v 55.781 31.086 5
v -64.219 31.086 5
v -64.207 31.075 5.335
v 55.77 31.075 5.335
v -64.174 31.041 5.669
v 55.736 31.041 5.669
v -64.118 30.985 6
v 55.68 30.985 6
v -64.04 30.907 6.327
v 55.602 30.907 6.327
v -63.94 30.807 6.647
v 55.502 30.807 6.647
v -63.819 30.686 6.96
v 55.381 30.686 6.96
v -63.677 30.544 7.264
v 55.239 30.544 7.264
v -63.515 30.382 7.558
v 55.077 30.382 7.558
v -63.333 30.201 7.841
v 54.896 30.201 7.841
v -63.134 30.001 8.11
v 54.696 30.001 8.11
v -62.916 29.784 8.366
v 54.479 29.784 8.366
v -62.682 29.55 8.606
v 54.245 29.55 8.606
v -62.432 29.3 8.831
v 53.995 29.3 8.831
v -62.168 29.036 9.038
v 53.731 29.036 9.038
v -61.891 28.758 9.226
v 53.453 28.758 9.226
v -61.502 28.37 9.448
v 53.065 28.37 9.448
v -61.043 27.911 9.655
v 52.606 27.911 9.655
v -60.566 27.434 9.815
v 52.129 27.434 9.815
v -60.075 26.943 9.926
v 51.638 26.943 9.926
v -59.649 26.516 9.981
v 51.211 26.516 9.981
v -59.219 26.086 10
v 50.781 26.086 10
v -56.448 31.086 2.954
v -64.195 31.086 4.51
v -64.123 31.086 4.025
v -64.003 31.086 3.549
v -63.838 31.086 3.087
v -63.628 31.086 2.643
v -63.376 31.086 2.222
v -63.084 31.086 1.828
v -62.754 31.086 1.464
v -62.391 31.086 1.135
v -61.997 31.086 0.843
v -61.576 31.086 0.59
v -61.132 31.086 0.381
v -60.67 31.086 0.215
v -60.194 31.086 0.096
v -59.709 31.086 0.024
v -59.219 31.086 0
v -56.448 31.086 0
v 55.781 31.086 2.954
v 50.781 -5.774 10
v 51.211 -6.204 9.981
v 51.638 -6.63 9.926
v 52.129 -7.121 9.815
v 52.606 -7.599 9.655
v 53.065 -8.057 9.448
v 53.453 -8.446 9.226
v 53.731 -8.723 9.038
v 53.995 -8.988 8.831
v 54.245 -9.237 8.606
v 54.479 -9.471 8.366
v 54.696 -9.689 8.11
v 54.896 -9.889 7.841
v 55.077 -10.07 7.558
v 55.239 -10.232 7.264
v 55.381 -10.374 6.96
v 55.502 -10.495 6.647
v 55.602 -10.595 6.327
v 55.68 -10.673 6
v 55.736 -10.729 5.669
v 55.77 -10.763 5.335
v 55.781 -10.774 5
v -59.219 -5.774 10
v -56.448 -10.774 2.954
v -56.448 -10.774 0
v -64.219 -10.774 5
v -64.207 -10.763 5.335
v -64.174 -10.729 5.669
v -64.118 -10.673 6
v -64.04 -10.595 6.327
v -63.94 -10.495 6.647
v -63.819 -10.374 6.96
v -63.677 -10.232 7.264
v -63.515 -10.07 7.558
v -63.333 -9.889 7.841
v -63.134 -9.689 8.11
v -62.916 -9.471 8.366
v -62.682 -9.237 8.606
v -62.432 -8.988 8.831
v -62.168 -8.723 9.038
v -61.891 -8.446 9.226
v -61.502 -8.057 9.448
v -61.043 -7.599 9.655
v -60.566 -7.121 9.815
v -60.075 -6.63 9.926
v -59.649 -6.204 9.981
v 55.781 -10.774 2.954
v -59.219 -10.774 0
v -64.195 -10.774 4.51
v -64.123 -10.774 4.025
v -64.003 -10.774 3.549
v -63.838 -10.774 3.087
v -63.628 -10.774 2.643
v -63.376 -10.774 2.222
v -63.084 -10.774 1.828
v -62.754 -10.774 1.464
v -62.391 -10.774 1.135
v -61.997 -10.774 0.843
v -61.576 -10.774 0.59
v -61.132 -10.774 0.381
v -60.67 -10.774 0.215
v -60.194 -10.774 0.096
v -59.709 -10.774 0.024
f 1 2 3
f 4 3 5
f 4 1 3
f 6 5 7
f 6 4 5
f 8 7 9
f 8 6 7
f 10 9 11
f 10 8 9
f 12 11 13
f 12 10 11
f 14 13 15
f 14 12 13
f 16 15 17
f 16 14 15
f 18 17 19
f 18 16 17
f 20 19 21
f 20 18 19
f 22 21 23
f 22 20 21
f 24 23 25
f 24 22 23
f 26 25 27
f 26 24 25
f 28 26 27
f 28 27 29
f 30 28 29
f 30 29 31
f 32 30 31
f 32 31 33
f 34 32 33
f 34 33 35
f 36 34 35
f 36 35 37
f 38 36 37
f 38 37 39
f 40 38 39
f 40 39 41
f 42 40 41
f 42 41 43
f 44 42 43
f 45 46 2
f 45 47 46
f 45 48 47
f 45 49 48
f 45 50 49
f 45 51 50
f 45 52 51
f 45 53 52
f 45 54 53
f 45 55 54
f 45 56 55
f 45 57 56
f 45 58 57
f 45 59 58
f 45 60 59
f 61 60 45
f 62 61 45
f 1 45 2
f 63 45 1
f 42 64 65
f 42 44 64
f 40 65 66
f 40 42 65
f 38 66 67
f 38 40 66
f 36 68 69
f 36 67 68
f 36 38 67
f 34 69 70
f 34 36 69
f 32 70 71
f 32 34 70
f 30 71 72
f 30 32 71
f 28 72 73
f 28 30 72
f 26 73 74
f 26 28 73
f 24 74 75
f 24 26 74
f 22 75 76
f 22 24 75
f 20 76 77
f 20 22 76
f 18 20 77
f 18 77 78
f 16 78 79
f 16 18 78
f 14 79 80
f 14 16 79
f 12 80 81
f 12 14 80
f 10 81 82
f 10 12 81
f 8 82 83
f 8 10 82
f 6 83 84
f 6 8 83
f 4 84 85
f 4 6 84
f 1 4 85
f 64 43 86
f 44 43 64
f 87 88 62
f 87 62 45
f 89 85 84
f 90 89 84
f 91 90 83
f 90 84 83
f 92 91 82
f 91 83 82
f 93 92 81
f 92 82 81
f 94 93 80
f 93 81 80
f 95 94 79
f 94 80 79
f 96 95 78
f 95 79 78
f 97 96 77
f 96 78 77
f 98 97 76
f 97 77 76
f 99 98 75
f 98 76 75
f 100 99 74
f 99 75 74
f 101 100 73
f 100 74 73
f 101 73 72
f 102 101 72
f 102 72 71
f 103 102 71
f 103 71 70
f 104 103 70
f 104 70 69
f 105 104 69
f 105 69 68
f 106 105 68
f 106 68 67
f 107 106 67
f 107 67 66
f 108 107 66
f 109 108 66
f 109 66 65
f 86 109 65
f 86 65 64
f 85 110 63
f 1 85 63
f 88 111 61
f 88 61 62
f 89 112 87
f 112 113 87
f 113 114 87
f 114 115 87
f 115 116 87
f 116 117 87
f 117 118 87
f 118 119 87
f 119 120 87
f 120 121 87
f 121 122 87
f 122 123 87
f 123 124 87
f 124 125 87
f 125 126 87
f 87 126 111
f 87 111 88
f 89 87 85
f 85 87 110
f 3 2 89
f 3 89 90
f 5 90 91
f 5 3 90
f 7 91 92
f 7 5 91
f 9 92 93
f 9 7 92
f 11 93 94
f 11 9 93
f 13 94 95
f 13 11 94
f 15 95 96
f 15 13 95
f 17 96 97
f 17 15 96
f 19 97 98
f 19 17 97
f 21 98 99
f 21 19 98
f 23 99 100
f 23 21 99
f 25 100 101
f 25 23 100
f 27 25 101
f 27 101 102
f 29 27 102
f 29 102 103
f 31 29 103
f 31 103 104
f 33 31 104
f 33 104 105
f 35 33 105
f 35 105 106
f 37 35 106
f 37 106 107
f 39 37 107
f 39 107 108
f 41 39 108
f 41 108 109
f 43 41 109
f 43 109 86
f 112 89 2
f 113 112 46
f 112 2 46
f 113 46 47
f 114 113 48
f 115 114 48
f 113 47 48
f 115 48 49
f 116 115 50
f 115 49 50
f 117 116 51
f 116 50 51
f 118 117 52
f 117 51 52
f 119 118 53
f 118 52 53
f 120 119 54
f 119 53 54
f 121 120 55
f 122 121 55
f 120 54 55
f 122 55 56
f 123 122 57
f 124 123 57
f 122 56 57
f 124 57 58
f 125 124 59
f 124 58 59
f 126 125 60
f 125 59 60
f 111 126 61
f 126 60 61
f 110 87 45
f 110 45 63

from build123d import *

# Parameters (mm, degrees)
F0_W     = 120
F0_H     = 41.8604637527
F1_DEPTH = 10
F2_W     = 112.2293550894
F2_H     = 2.9544678982
F3_DEPTH = 73.9
F4_R     = 4.99999


# Not quite as in the source:
# - a fillet or chamfer is up to 0.001 mm smaller than in the source, because OpenCascade refuses the exact size


with BuildPart() as f1:
    # F0 (on Top) → F1 (new body)
    with BuildSketch(Plane.XY):
        with Locations((-4.2187506333, 10.1562498603)):
            Rectangle(F0_W, F0_H)
    extrude(amount=F1_DEPTH)

    # F2 (on face) → F3 (cut)
    with BuildSketch(Plane.XZ.offset(10.773982016)):
        with Locations((-0.333428178, 1.4772339491)):
            Rectangle(F2_W, F2_H)
    extrude(amount=-F3_DEPTH, mode=Mode.SUBTRACT)

    # F4 (radius 5 in the source; OpenCascade refuses exactly that, so slightly less here)
    f4_edges = [f1.edges().sort_by_distance(p)[0] for p in [
        (-64.218751, 10.15625, 10),
        (-4.218751, 31.086482, 10),
        (-4.218751, -10.773982, 10),
        (55.781249, 10.15625, 10),
        (-64.218751, 10.15625, 0),
    ]]
    fillet(f4_edges, radius=F4_R)


solid = f1.part
